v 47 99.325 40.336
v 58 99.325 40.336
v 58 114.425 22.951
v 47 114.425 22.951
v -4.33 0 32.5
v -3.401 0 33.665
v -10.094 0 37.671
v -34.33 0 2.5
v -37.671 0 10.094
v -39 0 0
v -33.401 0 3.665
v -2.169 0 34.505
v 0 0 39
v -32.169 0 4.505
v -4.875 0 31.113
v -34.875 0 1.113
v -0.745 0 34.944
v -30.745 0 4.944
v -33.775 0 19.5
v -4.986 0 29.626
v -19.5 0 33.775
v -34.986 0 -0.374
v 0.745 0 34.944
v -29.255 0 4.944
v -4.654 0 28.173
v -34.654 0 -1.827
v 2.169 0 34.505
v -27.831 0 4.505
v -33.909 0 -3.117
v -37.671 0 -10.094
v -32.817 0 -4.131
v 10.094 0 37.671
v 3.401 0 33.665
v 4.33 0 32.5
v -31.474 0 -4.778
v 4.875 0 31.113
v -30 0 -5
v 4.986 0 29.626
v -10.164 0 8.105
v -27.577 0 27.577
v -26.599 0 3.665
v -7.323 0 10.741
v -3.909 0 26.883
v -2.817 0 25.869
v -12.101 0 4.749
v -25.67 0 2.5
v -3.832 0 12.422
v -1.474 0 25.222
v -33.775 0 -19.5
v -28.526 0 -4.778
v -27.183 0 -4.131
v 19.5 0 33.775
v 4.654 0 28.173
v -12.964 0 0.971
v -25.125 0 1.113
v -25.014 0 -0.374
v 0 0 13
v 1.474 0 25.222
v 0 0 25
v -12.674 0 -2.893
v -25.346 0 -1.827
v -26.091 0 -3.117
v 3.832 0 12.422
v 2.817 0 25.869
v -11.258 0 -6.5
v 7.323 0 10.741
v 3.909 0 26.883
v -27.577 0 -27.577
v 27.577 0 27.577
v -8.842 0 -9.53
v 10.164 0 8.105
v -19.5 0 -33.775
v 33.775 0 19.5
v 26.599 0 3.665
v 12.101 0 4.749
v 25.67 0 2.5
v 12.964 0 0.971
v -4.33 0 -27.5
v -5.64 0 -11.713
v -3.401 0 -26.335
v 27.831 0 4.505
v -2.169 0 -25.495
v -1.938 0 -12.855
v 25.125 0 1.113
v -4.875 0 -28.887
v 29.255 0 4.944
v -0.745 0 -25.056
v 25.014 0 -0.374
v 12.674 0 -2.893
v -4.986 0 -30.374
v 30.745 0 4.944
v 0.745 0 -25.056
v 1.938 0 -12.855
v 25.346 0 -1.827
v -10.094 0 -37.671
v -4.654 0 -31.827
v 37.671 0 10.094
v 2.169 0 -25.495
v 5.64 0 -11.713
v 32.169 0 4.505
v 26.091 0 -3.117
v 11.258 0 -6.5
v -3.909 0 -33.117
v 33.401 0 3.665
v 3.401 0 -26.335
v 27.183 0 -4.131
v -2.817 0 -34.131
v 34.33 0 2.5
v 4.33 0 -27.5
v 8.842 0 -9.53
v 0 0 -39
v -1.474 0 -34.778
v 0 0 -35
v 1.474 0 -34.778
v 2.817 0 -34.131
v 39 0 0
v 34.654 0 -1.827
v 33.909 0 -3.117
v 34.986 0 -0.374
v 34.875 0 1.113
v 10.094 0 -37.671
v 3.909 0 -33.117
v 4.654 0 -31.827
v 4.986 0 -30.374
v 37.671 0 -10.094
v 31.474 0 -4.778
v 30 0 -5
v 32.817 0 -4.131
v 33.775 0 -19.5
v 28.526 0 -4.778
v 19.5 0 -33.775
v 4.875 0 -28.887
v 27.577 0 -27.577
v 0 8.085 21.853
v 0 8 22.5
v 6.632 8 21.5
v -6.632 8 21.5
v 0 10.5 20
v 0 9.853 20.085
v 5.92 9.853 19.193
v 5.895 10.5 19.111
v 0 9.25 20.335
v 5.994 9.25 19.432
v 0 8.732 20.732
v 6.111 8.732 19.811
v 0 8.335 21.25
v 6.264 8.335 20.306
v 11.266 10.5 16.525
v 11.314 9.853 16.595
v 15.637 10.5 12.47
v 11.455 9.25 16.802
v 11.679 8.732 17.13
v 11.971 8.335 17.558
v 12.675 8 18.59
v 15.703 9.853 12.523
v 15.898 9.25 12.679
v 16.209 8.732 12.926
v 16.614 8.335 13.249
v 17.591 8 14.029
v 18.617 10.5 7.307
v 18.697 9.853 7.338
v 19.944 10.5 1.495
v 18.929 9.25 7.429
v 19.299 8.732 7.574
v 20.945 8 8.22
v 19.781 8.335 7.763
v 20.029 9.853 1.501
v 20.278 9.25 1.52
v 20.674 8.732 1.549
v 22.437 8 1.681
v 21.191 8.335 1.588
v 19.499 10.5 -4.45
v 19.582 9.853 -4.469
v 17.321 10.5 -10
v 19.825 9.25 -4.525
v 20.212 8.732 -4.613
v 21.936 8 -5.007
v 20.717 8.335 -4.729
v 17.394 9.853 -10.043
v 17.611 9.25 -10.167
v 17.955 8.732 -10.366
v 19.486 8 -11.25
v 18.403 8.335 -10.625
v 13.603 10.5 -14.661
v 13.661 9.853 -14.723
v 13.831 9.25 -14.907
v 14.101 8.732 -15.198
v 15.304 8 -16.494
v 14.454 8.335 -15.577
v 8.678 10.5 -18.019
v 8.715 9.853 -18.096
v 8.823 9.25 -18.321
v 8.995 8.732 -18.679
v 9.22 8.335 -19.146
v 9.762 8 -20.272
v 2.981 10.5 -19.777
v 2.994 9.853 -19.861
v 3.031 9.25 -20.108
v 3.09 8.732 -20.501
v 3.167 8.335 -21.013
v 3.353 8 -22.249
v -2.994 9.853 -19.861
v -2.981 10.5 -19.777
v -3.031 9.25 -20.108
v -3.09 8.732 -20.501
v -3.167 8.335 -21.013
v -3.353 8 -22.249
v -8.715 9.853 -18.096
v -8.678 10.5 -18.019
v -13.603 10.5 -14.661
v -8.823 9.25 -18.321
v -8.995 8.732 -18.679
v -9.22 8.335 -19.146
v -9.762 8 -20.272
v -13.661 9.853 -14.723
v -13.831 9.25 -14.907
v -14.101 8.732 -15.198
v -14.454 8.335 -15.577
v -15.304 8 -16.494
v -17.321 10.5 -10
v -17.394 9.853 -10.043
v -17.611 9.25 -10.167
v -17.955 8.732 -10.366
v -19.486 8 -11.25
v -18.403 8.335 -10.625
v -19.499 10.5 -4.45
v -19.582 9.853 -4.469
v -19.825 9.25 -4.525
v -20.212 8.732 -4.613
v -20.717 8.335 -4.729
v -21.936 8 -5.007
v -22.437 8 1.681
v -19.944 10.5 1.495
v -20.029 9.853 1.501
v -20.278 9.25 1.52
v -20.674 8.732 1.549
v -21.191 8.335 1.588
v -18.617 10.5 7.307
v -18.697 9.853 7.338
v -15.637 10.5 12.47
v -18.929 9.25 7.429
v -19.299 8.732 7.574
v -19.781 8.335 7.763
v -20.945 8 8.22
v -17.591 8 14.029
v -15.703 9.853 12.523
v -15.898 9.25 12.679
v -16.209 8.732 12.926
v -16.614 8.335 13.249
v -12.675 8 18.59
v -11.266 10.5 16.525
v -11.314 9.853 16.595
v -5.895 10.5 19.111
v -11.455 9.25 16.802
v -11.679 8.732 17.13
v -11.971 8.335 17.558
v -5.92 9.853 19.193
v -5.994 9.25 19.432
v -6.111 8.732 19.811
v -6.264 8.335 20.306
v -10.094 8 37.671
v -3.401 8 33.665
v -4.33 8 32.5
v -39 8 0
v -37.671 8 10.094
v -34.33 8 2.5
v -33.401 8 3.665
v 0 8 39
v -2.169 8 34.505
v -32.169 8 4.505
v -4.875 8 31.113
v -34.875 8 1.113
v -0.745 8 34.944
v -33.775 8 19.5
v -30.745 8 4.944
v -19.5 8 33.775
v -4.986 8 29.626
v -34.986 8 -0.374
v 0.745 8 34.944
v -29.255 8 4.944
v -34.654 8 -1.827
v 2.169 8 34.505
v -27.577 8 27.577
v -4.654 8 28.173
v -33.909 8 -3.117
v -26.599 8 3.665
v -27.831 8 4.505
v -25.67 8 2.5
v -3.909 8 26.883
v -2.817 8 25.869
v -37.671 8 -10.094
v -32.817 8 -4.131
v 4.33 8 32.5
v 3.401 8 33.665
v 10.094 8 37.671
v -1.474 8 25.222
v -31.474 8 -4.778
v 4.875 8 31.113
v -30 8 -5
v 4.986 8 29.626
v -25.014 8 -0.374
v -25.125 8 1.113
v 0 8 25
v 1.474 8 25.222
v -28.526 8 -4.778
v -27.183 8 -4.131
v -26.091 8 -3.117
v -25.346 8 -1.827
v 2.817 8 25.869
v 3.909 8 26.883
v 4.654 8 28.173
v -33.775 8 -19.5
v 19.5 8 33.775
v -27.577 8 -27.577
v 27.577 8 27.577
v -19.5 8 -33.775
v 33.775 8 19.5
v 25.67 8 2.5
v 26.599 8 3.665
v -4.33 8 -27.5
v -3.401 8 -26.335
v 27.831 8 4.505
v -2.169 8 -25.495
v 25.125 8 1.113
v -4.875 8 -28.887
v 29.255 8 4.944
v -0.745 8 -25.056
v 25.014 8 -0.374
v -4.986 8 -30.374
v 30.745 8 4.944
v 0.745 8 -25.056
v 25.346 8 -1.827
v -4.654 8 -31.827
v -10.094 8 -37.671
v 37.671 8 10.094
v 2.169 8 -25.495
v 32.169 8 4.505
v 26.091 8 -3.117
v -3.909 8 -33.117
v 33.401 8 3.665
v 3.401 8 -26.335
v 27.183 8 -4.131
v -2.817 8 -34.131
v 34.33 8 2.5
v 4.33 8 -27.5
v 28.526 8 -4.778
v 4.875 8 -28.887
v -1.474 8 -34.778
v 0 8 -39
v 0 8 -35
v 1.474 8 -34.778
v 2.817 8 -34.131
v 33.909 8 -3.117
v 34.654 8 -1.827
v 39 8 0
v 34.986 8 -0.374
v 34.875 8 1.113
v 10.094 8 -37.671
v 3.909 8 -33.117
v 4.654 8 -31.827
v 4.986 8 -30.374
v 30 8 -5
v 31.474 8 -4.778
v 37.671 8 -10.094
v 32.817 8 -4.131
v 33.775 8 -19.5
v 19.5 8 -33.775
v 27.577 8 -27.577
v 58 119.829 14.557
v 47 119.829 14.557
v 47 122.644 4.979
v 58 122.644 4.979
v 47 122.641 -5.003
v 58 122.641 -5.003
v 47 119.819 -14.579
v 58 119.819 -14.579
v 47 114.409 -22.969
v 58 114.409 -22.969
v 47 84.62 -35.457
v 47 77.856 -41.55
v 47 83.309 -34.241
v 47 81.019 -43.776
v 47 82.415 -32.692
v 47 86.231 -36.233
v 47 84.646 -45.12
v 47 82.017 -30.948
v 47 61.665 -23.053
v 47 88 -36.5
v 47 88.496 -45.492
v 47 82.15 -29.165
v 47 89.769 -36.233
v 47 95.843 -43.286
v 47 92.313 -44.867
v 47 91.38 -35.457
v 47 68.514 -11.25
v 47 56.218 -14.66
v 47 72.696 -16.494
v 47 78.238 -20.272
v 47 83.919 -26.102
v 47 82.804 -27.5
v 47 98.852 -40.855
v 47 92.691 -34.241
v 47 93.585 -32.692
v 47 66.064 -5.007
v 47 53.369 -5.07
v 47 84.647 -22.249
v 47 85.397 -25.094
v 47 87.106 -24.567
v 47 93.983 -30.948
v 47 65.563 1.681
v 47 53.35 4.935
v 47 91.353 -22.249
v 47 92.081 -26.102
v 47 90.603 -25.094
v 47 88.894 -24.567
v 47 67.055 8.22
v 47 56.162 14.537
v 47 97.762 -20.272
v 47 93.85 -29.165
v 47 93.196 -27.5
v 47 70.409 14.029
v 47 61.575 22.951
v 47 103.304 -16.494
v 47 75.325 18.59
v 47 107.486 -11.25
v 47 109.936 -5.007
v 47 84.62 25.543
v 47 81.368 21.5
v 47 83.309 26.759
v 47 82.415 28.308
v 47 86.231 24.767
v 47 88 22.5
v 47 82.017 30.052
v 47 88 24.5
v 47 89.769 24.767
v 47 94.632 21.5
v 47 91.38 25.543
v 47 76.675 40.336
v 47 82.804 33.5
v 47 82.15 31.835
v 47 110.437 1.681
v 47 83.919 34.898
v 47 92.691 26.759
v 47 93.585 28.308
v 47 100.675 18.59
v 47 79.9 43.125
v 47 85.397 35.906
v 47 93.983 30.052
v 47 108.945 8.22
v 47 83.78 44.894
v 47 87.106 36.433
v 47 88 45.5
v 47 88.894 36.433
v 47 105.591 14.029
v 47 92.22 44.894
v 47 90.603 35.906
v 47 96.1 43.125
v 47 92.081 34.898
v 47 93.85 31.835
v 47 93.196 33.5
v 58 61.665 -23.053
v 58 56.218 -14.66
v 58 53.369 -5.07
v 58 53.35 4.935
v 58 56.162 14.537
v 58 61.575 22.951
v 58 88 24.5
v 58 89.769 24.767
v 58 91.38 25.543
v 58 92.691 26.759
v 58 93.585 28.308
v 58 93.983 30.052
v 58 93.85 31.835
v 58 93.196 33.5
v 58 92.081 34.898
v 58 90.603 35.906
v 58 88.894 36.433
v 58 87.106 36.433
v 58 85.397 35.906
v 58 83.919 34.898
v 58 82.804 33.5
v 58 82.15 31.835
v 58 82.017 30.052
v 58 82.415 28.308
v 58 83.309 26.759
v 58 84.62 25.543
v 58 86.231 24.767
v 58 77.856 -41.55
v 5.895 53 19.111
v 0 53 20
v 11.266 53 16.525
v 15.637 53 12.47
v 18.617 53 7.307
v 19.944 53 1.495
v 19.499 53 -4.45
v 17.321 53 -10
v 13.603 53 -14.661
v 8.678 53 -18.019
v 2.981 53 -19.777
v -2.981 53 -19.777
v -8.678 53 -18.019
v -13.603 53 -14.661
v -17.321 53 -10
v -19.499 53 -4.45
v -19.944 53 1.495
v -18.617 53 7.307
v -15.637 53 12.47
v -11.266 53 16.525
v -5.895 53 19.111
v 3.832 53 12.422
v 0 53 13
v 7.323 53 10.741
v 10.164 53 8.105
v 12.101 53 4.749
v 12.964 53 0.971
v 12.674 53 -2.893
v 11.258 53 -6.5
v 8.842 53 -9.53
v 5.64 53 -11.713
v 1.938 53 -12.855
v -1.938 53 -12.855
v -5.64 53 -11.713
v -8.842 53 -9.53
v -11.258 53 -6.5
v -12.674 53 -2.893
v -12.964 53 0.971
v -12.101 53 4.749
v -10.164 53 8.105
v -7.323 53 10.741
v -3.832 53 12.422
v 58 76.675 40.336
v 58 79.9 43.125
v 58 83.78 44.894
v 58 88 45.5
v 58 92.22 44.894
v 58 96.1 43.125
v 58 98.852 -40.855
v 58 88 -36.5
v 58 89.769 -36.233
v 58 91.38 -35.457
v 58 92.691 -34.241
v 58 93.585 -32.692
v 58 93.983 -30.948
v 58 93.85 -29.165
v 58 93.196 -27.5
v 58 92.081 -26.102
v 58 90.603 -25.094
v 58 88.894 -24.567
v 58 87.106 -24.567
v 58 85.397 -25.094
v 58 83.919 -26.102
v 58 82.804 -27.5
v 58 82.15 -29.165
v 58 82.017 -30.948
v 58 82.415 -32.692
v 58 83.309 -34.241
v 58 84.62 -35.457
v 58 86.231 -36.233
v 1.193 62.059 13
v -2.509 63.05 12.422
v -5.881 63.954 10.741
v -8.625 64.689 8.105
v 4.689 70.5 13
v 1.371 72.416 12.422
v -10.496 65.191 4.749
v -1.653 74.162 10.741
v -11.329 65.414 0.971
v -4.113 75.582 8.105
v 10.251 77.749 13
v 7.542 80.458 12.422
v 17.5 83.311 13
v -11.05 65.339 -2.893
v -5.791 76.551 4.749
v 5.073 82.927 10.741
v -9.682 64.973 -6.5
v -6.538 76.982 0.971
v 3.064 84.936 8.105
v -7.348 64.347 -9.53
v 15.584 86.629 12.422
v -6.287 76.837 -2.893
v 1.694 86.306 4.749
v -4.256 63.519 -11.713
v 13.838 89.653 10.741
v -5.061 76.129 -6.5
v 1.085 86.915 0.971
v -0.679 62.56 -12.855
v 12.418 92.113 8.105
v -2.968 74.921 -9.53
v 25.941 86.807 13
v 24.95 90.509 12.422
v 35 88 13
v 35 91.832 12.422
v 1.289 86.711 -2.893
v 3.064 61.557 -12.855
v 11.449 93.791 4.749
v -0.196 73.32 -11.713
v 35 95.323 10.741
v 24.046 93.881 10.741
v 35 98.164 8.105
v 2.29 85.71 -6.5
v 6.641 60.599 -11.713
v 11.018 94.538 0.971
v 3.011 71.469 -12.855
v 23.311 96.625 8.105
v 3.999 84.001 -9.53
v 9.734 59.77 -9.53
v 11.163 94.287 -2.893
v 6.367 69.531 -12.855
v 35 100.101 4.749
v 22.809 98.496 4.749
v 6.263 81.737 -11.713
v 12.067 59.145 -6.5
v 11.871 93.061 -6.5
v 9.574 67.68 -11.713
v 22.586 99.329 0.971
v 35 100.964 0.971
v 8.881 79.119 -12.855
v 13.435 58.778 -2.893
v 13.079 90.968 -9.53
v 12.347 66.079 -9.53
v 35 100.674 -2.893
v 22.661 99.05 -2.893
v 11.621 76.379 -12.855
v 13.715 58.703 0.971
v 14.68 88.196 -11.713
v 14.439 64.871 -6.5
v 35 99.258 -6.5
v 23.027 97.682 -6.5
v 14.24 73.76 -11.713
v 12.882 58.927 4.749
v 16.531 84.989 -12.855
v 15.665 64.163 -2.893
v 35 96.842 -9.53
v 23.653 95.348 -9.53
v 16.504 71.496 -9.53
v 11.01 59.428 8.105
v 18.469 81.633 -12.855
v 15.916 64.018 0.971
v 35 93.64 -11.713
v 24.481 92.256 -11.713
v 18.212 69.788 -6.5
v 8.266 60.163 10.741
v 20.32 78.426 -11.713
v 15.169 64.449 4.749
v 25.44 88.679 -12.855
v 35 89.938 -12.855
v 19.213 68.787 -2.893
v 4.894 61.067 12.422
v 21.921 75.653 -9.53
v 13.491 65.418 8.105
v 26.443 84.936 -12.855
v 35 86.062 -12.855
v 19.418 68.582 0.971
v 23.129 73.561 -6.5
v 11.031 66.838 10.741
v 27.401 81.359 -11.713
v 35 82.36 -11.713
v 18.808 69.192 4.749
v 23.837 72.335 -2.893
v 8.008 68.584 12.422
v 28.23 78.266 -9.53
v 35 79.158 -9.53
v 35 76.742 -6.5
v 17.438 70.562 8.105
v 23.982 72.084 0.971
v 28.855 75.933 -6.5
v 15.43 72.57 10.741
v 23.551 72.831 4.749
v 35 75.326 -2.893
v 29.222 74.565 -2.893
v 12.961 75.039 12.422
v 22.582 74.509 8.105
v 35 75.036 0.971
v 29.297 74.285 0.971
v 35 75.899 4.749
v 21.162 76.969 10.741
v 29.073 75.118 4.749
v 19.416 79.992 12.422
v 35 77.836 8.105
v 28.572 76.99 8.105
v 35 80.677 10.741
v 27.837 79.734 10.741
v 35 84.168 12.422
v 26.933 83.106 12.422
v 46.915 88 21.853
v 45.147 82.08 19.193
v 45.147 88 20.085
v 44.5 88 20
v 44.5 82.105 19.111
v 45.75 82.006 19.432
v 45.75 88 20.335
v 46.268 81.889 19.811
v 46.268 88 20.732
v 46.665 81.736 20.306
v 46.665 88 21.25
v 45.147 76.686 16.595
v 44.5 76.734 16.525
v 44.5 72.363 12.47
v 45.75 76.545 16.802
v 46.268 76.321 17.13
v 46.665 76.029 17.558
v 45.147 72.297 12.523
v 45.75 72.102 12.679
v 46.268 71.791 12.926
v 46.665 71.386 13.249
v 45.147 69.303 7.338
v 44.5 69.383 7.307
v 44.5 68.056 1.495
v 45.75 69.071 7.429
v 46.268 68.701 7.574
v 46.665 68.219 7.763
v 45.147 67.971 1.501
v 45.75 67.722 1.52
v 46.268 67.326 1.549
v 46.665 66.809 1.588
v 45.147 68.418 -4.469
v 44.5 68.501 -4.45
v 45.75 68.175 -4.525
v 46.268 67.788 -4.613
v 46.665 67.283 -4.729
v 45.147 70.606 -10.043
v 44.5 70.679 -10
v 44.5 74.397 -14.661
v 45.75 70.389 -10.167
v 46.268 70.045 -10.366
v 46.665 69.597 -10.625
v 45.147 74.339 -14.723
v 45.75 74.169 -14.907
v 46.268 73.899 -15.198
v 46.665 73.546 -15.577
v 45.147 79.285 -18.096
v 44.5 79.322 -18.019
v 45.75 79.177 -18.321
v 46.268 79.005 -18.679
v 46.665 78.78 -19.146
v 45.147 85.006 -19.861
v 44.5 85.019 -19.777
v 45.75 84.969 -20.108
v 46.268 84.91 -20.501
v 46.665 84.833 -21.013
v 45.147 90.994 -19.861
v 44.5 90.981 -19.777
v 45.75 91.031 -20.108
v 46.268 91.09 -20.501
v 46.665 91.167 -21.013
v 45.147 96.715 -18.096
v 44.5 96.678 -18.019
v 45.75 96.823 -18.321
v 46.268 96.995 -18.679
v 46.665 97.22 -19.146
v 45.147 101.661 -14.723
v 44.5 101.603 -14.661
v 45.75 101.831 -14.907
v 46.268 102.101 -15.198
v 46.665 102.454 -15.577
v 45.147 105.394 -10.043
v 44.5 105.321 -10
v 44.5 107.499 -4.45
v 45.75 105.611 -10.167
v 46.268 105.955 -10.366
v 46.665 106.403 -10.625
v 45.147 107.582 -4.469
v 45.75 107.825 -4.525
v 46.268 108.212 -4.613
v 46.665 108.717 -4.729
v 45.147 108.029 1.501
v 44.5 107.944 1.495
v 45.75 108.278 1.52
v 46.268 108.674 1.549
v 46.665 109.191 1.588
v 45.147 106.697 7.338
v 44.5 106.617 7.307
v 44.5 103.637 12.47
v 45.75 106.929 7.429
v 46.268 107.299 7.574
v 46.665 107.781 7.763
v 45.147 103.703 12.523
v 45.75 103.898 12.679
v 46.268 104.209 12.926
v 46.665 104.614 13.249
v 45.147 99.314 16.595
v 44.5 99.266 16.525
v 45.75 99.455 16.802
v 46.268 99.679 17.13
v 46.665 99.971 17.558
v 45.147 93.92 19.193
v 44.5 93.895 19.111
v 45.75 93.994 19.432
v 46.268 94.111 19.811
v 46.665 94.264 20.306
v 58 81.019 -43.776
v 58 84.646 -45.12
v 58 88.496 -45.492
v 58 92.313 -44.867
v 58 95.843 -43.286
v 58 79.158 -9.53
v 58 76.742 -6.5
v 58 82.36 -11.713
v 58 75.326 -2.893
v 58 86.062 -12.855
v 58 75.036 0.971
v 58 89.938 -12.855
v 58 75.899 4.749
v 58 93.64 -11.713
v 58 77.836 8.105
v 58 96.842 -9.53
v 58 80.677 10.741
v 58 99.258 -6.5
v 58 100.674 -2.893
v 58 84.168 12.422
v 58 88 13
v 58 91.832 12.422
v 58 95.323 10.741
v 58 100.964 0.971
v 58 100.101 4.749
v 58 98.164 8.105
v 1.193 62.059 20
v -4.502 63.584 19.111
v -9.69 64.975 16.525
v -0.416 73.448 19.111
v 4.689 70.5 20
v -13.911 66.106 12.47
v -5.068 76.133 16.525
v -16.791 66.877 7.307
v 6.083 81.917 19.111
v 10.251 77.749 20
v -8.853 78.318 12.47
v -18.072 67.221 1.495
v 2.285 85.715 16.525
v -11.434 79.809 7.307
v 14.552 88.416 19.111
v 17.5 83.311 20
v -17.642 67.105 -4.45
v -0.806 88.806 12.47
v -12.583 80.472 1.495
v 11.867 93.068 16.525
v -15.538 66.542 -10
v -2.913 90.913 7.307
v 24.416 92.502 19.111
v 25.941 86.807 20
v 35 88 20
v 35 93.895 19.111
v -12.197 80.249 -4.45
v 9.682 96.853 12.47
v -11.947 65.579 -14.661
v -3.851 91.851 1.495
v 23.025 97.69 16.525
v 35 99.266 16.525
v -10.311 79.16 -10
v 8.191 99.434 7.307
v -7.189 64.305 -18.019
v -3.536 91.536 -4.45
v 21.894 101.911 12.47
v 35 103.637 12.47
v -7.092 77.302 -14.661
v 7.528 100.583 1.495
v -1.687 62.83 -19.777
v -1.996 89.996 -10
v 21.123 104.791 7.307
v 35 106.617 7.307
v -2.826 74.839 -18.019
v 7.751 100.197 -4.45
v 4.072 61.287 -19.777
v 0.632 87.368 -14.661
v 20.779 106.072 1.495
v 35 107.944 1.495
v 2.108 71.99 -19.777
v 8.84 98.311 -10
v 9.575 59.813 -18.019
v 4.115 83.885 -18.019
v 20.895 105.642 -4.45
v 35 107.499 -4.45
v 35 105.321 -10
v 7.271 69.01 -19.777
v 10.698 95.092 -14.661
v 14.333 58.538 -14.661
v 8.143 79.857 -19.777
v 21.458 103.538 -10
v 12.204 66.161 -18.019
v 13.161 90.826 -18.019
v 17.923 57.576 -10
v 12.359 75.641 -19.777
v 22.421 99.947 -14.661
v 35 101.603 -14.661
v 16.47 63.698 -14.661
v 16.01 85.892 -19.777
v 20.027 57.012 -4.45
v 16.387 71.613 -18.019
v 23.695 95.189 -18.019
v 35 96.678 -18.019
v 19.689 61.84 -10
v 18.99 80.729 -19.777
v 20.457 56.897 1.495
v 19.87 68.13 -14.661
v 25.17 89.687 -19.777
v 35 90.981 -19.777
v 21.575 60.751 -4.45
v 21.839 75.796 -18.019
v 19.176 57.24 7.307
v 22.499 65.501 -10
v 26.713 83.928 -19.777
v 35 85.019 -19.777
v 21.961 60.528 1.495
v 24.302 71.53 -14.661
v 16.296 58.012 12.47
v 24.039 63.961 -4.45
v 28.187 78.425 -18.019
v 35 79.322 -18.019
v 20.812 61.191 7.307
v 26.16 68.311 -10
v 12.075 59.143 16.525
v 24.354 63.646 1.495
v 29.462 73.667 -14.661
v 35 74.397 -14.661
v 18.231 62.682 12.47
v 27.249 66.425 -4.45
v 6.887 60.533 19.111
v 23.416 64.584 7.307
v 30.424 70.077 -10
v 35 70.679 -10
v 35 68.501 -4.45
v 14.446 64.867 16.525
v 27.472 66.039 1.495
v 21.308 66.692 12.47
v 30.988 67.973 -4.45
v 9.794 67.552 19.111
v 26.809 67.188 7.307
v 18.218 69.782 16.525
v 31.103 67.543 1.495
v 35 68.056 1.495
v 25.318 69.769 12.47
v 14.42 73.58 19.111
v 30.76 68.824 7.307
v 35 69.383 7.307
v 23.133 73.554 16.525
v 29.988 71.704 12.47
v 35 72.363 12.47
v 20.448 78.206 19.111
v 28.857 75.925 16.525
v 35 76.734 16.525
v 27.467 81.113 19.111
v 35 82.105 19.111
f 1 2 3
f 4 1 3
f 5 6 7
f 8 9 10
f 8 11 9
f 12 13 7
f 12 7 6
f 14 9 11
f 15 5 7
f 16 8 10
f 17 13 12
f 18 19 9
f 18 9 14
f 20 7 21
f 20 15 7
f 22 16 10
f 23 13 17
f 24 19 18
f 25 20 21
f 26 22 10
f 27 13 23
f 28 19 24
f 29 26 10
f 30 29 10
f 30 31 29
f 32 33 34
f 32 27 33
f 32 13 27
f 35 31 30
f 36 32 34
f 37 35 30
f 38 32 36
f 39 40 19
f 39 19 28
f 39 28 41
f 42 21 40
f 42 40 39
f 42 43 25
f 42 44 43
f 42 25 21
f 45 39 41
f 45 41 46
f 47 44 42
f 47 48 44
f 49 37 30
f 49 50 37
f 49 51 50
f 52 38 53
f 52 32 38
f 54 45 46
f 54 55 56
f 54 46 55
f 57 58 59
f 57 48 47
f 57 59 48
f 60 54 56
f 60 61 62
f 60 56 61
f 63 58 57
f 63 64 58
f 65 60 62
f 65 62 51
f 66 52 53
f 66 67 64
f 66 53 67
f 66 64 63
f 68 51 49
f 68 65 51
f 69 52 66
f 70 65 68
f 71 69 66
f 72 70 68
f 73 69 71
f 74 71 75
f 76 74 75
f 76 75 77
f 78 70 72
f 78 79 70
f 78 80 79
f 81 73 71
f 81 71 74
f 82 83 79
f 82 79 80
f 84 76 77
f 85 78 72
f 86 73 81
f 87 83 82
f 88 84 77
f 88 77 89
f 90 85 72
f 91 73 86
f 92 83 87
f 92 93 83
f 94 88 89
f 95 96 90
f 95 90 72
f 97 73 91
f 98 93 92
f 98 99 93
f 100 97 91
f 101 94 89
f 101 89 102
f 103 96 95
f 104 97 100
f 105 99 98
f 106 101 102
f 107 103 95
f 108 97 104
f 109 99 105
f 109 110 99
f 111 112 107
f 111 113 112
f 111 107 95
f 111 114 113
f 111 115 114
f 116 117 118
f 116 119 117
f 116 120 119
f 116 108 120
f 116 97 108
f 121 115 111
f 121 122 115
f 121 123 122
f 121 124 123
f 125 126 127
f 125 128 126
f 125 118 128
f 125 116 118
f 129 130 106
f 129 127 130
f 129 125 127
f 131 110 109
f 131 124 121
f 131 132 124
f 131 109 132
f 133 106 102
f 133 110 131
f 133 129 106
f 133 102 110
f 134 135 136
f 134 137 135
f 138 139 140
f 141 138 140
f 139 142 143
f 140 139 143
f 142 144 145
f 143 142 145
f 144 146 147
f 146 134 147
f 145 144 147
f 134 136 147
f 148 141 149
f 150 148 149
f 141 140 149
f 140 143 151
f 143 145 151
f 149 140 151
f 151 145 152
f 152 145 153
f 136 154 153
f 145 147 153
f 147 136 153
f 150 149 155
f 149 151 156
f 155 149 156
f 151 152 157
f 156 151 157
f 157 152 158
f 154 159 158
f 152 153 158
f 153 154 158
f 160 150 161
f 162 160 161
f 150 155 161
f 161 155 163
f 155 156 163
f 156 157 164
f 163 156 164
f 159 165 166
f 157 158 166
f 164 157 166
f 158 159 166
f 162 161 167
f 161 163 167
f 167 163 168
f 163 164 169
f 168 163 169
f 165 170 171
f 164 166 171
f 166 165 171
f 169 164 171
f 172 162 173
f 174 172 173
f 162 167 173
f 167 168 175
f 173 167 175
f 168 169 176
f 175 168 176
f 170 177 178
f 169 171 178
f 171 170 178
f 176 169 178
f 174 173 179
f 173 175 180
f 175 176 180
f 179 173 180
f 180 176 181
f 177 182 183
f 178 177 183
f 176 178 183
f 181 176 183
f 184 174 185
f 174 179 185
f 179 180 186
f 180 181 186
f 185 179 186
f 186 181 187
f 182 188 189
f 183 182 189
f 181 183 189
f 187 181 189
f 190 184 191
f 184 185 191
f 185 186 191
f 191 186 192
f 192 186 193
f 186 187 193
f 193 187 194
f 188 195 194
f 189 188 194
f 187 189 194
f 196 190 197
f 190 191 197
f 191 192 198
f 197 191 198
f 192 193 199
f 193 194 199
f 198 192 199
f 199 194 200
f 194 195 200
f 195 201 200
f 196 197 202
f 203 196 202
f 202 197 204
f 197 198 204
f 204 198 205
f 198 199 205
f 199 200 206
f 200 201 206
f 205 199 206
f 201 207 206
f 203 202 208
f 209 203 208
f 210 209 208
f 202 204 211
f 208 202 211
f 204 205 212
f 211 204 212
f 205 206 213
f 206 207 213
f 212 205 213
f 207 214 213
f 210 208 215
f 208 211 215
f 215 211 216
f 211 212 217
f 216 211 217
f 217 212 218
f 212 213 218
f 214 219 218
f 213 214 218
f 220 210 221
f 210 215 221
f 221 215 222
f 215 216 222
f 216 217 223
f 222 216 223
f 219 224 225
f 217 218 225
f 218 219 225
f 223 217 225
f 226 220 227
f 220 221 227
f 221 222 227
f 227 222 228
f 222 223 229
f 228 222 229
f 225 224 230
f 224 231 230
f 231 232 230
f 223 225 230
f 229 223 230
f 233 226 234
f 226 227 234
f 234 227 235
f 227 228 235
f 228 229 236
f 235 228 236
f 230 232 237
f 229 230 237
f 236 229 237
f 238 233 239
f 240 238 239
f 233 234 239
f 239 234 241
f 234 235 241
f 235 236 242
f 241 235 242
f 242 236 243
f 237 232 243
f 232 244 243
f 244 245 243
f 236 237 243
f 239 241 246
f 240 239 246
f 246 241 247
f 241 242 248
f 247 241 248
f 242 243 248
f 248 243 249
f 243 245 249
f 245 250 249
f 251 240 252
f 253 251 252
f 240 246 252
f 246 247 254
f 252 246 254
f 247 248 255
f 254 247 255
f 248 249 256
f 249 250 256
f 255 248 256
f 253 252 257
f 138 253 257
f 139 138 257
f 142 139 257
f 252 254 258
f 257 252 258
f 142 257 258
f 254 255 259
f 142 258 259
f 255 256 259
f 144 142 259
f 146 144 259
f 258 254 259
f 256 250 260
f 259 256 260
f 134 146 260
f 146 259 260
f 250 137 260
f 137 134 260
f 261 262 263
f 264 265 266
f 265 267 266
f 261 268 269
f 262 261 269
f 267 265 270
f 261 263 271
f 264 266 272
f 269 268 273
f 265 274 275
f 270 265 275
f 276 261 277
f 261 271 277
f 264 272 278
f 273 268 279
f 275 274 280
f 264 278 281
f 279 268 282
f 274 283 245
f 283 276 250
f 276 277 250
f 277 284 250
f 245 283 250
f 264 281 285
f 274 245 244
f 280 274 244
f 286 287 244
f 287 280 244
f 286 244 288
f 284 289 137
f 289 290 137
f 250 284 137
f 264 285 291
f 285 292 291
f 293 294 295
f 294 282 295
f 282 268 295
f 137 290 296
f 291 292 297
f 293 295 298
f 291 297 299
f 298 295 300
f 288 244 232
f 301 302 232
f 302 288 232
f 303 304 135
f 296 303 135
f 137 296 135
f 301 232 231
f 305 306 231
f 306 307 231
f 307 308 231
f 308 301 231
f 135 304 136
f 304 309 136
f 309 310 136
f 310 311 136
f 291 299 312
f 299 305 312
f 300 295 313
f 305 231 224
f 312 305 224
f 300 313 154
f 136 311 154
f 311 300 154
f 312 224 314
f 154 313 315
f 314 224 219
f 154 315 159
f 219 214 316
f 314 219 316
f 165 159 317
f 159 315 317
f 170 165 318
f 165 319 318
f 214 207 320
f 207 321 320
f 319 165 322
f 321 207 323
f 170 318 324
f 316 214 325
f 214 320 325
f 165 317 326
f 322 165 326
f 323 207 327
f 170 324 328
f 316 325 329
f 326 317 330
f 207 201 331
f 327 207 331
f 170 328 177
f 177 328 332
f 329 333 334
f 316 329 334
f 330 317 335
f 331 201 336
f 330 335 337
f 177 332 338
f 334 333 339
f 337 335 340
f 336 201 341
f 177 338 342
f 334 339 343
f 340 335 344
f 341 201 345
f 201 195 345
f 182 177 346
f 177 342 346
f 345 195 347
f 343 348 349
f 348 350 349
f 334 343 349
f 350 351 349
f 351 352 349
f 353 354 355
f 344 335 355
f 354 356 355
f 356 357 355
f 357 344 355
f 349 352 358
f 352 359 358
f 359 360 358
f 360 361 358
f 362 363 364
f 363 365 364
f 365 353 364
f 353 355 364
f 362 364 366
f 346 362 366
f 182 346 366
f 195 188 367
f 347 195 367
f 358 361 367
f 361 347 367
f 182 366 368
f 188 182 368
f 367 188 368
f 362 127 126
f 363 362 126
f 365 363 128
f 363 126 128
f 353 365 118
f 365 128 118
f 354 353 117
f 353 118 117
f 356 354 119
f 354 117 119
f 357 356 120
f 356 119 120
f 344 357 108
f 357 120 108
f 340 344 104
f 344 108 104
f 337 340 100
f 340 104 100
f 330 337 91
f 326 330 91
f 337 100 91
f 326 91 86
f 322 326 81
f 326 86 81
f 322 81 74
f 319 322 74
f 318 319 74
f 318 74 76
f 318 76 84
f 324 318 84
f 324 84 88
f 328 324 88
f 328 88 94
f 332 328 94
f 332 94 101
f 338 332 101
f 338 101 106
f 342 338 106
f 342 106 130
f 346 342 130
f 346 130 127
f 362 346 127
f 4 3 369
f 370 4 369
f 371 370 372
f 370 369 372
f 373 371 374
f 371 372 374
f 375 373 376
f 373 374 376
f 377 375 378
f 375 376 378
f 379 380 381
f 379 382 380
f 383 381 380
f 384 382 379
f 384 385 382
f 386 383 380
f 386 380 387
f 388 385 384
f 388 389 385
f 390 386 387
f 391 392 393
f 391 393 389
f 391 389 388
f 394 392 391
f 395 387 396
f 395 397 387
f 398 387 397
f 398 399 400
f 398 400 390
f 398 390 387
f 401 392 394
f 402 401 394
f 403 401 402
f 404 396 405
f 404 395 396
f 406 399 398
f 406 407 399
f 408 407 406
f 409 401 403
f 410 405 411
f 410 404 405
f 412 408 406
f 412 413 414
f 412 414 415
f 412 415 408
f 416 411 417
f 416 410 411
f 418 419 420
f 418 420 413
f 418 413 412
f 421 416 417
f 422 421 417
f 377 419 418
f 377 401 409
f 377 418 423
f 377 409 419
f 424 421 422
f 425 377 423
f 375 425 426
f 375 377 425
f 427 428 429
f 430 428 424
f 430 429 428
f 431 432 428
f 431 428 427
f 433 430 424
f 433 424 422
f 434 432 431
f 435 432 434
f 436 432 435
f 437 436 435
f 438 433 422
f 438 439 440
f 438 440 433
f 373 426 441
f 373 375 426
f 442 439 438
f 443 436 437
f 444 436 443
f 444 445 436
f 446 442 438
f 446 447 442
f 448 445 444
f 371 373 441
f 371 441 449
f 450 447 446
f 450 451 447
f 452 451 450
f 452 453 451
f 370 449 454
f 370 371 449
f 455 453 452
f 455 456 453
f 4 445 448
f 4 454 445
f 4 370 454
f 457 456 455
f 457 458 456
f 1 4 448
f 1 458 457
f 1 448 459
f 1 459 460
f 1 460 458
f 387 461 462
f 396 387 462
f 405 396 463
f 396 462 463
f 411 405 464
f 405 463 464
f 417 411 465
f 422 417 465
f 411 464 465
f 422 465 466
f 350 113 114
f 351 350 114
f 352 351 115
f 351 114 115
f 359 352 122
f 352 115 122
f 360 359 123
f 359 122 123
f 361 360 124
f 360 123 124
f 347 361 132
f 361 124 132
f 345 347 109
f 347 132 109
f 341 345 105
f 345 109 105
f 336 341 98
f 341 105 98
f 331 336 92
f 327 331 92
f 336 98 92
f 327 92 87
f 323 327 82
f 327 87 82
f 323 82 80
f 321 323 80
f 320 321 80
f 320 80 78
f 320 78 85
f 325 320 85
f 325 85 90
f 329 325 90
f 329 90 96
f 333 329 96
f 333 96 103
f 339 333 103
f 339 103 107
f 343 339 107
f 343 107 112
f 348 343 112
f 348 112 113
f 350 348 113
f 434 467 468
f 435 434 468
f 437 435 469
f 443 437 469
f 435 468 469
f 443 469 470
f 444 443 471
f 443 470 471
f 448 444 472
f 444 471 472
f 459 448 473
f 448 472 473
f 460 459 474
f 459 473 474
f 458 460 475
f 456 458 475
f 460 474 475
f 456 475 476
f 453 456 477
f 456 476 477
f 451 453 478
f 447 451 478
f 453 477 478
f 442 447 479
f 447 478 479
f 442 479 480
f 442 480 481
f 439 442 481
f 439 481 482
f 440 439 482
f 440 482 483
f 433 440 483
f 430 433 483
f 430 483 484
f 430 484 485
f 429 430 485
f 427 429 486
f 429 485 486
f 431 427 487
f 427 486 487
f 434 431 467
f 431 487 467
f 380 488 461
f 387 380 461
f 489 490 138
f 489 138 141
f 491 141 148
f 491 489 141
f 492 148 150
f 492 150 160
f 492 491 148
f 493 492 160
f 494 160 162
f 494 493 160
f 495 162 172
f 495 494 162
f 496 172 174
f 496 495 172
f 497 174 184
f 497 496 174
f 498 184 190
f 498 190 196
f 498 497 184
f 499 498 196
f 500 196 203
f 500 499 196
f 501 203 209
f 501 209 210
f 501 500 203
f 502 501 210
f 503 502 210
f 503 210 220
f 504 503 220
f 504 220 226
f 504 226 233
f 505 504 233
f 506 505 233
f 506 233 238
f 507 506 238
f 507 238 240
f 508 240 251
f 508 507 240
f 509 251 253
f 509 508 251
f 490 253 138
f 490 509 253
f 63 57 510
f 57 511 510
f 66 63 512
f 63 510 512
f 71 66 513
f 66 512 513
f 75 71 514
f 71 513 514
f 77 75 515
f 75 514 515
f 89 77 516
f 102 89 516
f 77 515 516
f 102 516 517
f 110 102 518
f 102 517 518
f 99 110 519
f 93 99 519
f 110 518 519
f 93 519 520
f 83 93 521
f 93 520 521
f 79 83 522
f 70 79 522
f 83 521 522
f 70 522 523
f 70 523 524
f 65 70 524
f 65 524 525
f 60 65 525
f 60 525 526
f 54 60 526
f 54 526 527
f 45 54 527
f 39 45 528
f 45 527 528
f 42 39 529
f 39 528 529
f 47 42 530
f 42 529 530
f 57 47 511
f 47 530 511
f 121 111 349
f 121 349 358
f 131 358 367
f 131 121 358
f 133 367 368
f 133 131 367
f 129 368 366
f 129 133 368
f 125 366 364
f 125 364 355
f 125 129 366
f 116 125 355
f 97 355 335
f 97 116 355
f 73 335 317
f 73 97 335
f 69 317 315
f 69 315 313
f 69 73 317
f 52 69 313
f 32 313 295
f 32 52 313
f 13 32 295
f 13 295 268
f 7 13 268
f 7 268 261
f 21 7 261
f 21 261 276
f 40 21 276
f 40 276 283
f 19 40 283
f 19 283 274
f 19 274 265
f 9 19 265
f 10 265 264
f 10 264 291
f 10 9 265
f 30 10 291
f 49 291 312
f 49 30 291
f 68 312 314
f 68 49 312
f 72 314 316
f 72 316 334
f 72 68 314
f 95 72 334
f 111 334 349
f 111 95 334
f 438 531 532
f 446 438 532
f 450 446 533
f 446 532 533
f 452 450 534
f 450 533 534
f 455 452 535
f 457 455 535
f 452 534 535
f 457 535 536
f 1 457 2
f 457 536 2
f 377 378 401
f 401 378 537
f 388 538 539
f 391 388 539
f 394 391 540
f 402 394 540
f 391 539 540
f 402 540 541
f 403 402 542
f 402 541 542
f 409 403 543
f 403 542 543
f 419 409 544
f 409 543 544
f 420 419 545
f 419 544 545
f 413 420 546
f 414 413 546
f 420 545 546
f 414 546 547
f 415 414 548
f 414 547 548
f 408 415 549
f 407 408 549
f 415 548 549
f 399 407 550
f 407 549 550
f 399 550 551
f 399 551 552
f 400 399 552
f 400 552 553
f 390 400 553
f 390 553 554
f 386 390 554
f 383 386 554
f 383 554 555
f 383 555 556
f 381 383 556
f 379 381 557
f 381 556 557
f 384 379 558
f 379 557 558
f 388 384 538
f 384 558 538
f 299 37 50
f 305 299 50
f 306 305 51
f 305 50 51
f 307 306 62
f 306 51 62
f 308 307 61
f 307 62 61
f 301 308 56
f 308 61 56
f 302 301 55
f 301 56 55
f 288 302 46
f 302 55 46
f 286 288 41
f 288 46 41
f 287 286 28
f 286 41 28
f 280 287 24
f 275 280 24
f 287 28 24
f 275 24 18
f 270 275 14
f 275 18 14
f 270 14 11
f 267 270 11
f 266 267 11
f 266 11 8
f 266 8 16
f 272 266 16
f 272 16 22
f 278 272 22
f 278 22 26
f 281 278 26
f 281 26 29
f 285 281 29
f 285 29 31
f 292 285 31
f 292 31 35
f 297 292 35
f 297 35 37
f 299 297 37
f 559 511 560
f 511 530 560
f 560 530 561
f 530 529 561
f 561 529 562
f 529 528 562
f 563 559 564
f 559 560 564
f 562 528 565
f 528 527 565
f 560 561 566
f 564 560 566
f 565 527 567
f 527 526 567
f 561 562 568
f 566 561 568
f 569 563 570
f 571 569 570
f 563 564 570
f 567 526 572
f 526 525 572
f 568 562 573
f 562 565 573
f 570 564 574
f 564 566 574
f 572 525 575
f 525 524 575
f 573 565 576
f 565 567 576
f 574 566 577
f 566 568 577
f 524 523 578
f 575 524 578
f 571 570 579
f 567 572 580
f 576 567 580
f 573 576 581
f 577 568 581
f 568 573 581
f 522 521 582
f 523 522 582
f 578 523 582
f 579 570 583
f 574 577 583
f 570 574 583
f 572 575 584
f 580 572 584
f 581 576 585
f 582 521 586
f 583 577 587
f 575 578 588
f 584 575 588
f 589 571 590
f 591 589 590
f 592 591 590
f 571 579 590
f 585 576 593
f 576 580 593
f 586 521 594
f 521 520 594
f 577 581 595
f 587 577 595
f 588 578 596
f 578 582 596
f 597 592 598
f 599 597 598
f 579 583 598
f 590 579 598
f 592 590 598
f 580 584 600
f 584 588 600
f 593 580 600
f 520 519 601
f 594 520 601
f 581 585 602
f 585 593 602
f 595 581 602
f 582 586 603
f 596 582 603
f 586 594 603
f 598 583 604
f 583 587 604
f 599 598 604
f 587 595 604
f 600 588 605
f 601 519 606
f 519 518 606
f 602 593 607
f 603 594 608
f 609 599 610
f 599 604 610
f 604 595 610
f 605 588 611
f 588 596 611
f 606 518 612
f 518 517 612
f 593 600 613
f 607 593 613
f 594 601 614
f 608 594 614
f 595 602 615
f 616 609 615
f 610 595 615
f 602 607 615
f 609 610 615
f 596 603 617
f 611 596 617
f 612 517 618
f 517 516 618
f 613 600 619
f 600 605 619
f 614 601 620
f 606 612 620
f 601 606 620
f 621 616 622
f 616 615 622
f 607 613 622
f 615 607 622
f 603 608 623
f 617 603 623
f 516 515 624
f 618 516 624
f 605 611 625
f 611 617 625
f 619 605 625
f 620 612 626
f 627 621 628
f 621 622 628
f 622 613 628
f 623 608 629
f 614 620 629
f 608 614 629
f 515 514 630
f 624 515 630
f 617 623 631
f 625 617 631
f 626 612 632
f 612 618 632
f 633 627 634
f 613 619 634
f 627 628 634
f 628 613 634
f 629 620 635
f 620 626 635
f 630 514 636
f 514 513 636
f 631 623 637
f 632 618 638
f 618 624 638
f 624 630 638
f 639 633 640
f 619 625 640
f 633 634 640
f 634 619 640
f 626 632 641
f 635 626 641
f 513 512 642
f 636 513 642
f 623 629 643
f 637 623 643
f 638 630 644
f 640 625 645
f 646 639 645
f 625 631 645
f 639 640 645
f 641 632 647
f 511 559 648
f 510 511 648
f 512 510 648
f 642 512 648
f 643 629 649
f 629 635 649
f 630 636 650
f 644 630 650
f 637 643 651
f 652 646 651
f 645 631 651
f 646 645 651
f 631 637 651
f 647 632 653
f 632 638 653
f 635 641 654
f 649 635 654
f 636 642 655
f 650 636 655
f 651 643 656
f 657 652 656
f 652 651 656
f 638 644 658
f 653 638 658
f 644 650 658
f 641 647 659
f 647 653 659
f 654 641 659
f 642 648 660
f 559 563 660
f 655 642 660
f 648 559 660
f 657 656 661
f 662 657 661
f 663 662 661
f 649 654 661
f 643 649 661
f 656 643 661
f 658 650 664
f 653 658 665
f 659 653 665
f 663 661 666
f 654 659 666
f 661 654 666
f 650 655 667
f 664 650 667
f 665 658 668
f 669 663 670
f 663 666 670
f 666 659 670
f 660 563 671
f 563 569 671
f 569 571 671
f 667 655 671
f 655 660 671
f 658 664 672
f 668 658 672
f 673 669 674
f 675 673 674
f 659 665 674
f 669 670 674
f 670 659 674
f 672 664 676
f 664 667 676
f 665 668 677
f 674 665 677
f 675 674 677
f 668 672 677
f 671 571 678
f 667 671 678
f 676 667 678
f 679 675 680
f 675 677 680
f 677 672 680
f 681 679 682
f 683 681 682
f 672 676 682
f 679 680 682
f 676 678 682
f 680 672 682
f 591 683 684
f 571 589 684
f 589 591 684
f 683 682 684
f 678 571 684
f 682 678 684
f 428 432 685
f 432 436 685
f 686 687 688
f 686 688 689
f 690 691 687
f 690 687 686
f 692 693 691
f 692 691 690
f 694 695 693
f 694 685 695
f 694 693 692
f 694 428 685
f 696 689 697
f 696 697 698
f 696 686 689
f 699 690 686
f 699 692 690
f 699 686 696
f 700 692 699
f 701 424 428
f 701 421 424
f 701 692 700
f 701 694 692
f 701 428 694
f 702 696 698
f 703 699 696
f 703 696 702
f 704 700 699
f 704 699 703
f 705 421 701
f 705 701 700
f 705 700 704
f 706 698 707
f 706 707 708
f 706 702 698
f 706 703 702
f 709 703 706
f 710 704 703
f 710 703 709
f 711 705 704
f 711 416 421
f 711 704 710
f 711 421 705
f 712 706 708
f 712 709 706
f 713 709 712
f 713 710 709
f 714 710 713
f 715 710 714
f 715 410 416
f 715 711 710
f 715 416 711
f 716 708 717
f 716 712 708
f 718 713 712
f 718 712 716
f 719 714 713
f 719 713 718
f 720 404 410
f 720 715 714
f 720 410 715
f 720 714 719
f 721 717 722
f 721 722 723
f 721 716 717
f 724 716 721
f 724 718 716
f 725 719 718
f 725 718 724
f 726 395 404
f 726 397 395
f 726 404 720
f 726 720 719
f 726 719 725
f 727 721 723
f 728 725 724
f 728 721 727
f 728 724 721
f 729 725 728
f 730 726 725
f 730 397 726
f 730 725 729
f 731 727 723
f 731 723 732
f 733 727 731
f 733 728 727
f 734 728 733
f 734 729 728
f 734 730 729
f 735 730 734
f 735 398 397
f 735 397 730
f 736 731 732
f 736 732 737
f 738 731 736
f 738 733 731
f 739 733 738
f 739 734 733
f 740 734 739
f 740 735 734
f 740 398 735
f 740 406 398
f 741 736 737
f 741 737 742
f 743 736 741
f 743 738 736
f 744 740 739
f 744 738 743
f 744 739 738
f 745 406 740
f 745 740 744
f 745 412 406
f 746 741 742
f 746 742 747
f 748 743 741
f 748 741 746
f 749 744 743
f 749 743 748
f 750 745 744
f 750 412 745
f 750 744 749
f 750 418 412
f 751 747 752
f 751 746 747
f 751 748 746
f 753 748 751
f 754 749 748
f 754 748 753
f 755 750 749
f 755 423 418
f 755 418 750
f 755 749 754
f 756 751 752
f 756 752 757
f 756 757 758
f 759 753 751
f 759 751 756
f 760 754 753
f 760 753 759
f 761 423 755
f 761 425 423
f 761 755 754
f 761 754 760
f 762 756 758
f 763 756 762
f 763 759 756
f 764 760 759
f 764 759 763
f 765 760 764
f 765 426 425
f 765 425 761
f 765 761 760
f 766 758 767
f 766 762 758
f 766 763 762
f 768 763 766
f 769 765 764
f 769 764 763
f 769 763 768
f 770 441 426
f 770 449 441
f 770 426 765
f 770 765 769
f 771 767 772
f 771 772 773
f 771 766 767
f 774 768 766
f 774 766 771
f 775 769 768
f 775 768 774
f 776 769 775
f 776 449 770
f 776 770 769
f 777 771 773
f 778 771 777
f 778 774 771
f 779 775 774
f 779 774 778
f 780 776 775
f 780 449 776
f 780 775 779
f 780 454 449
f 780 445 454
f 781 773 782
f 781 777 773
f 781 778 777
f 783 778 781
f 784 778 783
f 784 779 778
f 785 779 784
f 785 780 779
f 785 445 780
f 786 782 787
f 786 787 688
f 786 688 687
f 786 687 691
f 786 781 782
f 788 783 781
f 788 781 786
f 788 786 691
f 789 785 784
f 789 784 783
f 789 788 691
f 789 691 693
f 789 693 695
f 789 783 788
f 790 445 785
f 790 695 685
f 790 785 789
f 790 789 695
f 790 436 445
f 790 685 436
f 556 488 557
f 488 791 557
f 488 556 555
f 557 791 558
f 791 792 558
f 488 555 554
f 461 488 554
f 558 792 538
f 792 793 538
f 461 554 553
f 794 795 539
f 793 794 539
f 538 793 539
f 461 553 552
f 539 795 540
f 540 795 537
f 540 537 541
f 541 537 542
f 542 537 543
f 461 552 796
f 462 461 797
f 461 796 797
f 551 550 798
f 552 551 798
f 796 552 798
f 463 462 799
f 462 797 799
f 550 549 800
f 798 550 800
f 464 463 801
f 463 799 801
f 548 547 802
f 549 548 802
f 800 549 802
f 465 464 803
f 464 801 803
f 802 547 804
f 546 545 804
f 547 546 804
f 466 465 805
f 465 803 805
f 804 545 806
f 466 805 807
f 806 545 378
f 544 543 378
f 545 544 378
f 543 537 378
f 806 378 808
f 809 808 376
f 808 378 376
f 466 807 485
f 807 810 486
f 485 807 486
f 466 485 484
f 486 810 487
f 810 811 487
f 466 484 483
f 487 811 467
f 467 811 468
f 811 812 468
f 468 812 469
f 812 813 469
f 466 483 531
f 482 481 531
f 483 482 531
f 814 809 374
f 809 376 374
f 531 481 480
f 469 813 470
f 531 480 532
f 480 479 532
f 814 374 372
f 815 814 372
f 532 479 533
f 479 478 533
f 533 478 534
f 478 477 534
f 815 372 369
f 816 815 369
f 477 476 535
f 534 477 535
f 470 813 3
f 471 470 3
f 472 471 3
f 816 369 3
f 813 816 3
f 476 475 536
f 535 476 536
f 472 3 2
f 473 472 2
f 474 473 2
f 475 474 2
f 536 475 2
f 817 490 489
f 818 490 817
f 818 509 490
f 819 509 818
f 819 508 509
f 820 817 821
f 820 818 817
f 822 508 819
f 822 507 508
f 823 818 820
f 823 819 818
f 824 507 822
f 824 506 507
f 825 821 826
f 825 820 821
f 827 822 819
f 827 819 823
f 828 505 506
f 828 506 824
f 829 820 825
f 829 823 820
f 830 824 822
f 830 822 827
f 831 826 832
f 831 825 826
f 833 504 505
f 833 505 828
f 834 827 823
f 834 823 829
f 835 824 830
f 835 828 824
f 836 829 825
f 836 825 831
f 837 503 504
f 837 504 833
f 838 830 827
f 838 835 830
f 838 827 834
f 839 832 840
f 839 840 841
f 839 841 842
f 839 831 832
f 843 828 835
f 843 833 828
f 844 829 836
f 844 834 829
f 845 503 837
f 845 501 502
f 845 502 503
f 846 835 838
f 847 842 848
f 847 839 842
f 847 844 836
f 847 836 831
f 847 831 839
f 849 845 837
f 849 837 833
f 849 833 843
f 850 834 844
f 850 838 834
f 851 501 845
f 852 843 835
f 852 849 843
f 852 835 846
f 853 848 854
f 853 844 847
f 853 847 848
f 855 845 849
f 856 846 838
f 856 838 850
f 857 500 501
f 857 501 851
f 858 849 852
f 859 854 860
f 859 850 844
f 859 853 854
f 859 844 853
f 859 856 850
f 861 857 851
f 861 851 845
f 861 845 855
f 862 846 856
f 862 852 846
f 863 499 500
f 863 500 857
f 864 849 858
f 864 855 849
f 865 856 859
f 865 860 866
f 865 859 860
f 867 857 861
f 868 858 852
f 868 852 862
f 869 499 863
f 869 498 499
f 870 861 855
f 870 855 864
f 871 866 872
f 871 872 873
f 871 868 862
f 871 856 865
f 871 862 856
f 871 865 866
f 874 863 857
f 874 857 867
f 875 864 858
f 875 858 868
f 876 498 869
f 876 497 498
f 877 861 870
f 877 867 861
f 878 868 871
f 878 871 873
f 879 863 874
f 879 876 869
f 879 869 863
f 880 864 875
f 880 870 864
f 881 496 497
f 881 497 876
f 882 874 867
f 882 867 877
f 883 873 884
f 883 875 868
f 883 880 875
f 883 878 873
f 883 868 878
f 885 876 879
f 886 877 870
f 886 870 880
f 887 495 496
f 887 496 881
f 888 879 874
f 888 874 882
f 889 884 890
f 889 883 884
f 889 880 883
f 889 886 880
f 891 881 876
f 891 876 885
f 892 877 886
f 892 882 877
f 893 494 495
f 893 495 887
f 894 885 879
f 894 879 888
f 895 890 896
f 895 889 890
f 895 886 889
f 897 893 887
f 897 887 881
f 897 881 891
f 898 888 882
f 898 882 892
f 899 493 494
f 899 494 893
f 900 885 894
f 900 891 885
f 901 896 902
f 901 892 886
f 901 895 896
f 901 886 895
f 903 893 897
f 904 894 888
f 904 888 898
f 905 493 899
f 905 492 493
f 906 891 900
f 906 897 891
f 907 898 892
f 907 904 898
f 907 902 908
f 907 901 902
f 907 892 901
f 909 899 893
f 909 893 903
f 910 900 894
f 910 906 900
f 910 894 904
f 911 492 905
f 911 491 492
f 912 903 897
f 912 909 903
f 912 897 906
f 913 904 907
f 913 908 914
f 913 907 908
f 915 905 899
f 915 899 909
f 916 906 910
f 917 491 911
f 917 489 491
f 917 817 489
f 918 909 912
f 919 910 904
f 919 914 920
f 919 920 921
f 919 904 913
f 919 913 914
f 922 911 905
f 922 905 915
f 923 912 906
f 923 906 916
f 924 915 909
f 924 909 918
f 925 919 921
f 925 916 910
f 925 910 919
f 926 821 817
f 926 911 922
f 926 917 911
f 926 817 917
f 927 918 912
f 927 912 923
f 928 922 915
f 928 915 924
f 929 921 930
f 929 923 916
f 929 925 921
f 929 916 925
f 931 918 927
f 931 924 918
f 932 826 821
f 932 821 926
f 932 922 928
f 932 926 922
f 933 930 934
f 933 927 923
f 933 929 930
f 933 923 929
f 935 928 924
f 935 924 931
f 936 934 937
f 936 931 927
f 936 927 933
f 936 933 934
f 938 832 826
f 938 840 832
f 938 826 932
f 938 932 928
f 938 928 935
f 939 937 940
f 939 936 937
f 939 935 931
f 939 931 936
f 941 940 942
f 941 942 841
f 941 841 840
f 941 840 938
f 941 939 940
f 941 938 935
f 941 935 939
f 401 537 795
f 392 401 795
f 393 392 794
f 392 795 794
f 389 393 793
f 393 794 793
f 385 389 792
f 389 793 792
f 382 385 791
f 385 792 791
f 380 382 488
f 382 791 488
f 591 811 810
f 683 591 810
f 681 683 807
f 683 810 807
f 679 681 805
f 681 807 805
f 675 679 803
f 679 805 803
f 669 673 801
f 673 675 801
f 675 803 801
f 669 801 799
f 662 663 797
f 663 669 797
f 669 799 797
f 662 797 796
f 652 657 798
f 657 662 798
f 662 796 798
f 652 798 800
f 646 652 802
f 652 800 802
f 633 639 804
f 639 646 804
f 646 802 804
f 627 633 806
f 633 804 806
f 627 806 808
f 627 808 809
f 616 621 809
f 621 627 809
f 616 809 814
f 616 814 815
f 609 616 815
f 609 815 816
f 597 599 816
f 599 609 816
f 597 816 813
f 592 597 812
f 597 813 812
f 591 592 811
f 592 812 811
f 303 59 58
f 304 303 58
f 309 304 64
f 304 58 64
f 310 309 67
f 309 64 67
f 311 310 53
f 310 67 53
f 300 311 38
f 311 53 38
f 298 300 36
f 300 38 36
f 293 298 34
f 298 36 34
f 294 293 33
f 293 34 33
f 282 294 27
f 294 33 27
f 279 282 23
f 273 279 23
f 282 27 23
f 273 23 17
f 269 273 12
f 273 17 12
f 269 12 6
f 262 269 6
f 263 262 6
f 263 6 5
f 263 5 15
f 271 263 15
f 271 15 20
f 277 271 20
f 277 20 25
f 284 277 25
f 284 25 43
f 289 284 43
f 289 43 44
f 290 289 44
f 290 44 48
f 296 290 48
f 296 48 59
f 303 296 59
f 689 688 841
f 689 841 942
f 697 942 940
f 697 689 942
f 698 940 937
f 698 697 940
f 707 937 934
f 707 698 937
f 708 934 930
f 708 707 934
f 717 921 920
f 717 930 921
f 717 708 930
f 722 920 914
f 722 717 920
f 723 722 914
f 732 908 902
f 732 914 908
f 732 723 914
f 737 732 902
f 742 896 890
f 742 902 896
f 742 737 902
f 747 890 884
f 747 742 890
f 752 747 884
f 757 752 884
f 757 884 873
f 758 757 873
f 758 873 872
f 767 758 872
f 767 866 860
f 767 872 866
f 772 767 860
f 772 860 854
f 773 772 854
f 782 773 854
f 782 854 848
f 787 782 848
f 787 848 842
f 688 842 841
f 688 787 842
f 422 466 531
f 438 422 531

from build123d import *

# Parameters (mm, degrees)
BARRER_L_MINA1_PROFILE_R   = 20
BARRER_L_MINA1_PROFILE_R_2 = 13
CROQUIS166_R               = 6
CROQUIS166_R_2             = 20
SALIENTE_EXTRUIR2_DEPTH    = 11
SALIENTE_EXTRUIR3_START    = -8
CROQUIS167_R               = 39
CROQUIS167_R_2             = 13
SALIENTE_EXTRUIR3_DEPTH    = 8
CROQUIS168_R               = 5
CORTAR_EXTRUIR2_DEPTH      = 15
REDONDEO1_R                = 2.5
REDONDEO2_R                = 2.5


with BuildPart() as part:
    # Barrer-Lámina1: sweep along a path in Croquis8
    with BuildLine(Plane.XY) as barrer_l_mina1_path:
        Line((0, 0), (0, 53))
        ThreePointArc((0, 53), (10.251262658, 77.748737342), (35, 88))
        Line((35, 88), (58, 88))
    # Barrer-Lámina1 profile (on start of the path) → Barrer-Lámina1 (sweep)
    with BuildSketch(Plane.ZX):
        Circle(BARRER_L_MINA1_PROFILE_R)
        Circle(BARRER_L_MINA1_PROFILE_R_2, mode=Mode.SUBTRACT)
    sweep(path=barrer_l_mina1_path.line)

    # Croquis166 → Saliente-Extruir2 (add)
    with BuildSketch(Plane(origin=(58, 0, 0), x_dir=(0, 0, -1), z_dir=(1, 0, 0))):
        with BuildLine():
            Line((-40.336065574, 99.324831744), (-22.950819672, 114.424607403))
            ThreePointArc((-22.950819672, 114.424607403), (0.012124177, 122.9999979), (22.969121399, 114.408700501))
            Line((22.969121399, 114.408700501), (40.855221071, 98.852160917))
            ThreePointArc((40.855221071, 98.852160917), (45.491803378, 88.495813939), (41.549621493, 77.8557472))
            Line((41.549621493, 77.8557472), (23.053076053, 61.664554599))
            ThreePointArc((23.053076053, 61.664554599), (0.067834781, 53.000065737), (-22.950819672, 61.575392597))
            Line((-22.950819672, 61.575392597), (-40.336065574, 76.675168256))
            ThreePointArc((-40.336065574, 76.675168256), (-45.5, 88), (-40.336065574, 99.324831744))
        make_face()
        with Locations((-30.5, 88)):
            Circle(CROQUIS166_R, mode=Mode.SUBTRACT)
        with Locations((30.5, 88)):
            Circle(CROQUIS166_R, mode=Mode.SUBTRACT)
        with Locations((0, 88)):
            Circle(CROQUIS166_R_2, mode=Mode.SUBTRACT)
    extrude(amount=-SALIENTE_EXTRUIR2_DEPTH)

    # Croquis167 → Saliente-Extruir3 (add)
    with BuildSketch(Plane.XZ.offset(SALIENTE_EXTRUIR3_START)):
        Circle(CROQUIS167_R)
        Circle(CROQUIS167_R_2, mode=Mode.SUBTRACT)
    extrude(amount=SALIENTE_EXTRUIR3_DEPTH)

    # Croquis168 → Cortar-Extruir2 (cut)
    with BuildSketch(Plane.XZ):
        with Locations((0, 30)):
            Circle(CROQUIS168_R)
        with Locations((0, -30)):
            Circle(CROQUIS168_R)
        with Locations((30, 0)):
            Circle(CROQUIS168_R)
        with Locations((-30, 0)):
            Circle(CROQUIS168_R)
    extrude(amount=-CORTAR_EXTRUIR2_DEPTH, mode=Mode.SUBTRACT)

    # Redondeo1
    redondeo1_edges = [part.edges().sort_by_distance(p)[0] for p in [
        (47, 88, -20),
    ]]
    fillet(redondeo1_edges, radius=REDONDEO1_R)

    # Redondeo2
    redondeo2_edges = [part.edges().sort_by_distance(p)[0] for p in [
        (0, 8, -20),
    ]]
    fillet(redondeo2_edges, radius=REDONDEO2_R)


solid = part.part
